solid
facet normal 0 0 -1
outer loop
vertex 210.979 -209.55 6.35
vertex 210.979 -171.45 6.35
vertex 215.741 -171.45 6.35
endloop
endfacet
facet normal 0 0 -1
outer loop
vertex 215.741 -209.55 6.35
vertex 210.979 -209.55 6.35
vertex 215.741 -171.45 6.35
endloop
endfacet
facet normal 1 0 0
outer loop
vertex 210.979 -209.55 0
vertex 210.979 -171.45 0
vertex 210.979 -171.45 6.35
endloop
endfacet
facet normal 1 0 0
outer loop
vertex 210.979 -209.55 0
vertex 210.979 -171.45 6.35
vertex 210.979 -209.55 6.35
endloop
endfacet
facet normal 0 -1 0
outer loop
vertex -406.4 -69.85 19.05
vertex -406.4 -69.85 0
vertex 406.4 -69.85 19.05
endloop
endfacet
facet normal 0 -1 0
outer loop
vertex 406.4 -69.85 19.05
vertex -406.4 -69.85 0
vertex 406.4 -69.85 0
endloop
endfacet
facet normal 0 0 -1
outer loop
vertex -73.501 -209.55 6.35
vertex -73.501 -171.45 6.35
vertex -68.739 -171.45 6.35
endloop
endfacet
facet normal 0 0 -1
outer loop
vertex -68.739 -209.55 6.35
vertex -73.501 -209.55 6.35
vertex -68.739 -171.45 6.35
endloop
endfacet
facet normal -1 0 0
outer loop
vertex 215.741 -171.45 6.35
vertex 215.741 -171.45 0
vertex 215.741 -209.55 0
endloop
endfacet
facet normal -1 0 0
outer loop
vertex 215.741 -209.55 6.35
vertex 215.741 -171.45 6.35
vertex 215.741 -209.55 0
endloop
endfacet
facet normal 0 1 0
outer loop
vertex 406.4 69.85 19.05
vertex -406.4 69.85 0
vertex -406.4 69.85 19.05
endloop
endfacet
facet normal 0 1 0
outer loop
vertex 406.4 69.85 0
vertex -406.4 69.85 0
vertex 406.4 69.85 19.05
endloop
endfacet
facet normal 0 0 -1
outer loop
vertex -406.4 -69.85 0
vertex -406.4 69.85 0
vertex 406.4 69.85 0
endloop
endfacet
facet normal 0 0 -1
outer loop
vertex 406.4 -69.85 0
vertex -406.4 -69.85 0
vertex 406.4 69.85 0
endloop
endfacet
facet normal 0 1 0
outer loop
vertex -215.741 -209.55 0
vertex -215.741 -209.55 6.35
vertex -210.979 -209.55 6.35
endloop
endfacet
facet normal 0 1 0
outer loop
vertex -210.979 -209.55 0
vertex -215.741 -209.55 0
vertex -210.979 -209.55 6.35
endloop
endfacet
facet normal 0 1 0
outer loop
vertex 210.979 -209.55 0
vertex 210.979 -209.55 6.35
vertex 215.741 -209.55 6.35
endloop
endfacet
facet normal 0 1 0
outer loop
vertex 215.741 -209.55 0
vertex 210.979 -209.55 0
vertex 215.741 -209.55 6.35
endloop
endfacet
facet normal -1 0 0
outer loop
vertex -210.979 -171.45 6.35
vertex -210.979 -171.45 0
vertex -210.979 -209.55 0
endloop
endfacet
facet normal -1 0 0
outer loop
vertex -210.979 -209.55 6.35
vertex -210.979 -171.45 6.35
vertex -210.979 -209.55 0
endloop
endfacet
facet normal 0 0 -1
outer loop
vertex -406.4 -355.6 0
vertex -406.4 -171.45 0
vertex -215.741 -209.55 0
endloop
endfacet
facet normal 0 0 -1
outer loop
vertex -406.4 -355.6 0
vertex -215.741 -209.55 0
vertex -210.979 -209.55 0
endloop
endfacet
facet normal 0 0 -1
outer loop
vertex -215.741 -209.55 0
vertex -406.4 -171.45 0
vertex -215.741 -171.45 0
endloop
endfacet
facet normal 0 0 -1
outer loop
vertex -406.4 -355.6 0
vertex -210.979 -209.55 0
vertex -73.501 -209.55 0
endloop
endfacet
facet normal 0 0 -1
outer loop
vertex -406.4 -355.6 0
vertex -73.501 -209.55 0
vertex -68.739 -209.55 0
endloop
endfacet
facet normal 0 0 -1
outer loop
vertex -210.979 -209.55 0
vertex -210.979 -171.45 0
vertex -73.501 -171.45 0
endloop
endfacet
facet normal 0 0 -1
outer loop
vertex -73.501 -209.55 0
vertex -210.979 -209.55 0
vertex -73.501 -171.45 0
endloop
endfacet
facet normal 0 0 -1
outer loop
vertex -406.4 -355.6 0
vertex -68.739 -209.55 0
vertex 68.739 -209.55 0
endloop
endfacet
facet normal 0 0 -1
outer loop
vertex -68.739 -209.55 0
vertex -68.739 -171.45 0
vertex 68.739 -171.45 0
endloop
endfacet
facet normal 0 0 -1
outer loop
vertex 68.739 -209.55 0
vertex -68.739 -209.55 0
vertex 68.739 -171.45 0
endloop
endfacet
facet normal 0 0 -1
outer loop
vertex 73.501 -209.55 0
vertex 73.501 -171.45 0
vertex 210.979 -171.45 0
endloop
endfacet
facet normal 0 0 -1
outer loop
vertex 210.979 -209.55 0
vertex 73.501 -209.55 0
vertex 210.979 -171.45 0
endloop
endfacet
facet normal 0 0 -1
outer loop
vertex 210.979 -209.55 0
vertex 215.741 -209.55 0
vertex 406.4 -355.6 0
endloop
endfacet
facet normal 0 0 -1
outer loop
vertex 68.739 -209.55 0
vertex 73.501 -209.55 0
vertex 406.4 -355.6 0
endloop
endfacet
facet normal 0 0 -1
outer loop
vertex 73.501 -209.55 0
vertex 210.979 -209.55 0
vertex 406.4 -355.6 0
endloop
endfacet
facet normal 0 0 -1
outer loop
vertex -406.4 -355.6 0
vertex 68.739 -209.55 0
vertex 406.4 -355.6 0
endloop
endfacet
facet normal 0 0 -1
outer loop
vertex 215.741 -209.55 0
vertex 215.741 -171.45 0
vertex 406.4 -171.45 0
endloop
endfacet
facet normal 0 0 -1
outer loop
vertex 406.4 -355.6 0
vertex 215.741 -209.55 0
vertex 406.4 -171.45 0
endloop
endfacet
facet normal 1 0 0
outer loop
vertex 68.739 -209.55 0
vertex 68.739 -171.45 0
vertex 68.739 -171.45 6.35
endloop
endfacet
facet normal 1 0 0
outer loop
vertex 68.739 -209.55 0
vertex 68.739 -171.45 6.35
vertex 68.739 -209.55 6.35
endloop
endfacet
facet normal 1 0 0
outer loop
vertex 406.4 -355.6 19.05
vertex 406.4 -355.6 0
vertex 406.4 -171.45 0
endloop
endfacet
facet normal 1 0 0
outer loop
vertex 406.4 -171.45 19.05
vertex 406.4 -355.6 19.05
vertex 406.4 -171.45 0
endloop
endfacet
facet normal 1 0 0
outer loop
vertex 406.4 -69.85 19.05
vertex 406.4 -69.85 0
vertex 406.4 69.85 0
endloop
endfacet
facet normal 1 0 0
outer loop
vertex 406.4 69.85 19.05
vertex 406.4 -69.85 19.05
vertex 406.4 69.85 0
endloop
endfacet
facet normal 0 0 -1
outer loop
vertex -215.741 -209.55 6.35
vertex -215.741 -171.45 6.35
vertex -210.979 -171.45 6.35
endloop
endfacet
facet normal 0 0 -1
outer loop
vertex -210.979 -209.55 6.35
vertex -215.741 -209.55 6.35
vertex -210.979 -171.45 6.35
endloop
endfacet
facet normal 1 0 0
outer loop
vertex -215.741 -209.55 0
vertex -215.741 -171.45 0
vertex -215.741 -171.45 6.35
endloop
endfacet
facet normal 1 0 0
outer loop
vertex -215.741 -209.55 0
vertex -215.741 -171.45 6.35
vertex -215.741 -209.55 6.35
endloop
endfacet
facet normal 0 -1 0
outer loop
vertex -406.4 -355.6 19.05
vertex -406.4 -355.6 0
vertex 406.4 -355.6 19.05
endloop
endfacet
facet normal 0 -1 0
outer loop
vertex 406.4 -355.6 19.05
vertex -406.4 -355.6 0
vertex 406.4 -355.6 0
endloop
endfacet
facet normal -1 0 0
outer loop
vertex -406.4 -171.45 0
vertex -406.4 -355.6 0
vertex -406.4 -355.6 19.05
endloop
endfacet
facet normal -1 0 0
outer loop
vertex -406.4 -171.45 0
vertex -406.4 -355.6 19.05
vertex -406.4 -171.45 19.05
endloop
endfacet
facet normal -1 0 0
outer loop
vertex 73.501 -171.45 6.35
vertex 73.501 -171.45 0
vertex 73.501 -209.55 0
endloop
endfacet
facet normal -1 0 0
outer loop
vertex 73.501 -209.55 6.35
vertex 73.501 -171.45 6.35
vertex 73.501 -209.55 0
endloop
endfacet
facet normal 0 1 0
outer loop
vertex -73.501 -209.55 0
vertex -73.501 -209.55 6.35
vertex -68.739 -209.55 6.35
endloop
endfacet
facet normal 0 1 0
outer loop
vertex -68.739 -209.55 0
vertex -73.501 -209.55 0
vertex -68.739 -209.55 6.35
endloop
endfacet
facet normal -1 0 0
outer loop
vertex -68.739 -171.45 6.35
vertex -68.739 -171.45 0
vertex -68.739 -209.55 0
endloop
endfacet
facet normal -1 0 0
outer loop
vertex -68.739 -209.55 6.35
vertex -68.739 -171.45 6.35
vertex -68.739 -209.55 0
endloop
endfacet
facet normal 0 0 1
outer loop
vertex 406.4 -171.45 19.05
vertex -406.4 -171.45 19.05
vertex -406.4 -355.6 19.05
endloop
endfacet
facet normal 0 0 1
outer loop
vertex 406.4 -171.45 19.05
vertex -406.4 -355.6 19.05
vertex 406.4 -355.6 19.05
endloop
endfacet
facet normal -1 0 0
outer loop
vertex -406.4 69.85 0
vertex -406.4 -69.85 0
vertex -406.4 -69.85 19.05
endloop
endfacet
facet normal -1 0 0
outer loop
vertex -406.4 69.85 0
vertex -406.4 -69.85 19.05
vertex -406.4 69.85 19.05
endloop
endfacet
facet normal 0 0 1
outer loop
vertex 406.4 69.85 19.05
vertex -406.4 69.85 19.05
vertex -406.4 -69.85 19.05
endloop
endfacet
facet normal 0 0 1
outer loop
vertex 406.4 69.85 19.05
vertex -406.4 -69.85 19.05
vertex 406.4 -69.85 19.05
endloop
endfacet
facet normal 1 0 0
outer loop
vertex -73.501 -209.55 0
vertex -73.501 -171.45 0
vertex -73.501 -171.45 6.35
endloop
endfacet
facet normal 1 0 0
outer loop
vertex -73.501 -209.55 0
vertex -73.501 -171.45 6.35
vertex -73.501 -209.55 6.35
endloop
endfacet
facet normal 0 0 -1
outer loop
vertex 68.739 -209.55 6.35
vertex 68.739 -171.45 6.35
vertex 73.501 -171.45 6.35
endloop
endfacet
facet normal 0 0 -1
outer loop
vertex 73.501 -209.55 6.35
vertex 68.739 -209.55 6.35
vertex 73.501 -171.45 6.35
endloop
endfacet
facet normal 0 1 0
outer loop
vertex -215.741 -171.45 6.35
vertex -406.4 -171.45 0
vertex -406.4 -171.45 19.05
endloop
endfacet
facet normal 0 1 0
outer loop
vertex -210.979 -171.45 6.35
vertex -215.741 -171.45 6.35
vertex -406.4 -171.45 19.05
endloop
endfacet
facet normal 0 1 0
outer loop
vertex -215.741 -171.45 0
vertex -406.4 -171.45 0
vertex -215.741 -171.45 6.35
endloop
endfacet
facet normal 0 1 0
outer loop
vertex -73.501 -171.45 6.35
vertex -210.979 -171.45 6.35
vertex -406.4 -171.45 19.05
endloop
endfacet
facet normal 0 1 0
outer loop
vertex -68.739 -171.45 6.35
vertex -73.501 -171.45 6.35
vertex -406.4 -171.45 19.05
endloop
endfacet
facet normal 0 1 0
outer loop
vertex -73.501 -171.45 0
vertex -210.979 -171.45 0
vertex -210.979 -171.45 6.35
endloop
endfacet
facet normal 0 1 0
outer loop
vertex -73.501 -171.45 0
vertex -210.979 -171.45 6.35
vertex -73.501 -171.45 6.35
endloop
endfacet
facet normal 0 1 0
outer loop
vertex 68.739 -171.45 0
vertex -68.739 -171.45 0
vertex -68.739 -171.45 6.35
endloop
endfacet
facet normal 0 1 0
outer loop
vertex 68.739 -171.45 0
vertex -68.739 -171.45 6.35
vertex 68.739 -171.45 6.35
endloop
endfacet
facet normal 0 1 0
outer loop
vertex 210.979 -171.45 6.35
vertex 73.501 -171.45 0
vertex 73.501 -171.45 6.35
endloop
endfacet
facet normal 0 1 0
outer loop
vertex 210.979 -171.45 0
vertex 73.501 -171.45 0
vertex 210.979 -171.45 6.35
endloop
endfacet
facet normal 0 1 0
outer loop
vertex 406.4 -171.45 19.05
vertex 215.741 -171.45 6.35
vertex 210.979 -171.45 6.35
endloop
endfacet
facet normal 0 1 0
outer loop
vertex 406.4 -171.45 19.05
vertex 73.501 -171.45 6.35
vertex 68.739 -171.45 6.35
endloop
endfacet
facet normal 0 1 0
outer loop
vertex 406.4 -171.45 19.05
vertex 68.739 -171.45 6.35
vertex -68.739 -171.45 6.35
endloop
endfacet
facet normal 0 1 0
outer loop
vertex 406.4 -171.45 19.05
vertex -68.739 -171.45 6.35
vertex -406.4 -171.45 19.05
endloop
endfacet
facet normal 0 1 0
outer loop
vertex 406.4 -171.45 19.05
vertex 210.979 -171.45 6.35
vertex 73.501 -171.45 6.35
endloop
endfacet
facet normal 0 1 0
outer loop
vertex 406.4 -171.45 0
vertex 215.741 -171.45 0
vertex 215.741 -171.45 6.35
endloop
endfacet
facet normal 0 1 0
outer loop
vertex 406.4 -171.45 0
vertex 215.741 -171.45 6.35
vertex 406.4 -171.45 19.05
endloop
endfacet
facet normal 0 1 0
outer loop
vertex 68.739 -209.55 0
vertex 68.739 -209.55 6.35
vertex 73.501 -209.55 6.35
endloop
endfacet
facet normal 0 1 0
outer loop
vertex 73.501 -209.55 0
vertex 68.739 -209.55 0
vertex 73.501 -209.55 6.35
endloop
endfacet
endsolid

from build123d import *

# Parameters (mm, degrees)
F0_W     = 812.8
F0_H     = 139.7
F1_DEPTH = 19.05
F2_W     = 812.8
F2_H     = 184.15
F3_DEPTH = 19.05
F4_W     = 4.7625
F4_H     = 38.1
F5_DEPTH = 6.35


with BuildPart() as f1:
    # F0 (on Top) → F1 (new body)
    with BuildSketch(Plane.XY):
        Rectangle(F0_W, F0_H)
    extrude(amount=F1_DEPTH)


with BuildPart() as f3:
    # F2 (on Top) → F3 (new body)
    with BuildSketch(Plane.XY):
        with Locations((0, -263.525)):
            Rectangle(F2_W, F2_H)
    extrude(amount=F3_DEPTH)

    # F4 (on face) → F5 (cut)
    with BuildSketch(Plane(origin=(0, 0, 0), x_dir=(1, 0, 0), z_dir=(0, 0, -1))):
        with Locations((71.12, 190.5)):
            Rectangle(F4_W, F4_H)
        with Locations((213.36, 190.5)):
            Rectangle(F4_W, F4_H)
        with Locations((-213.36, 190.5)):
            Rectangle(F4_W, F4_H)
        with Locations((-71.12, 190.5)):
            Rectangle(F4_W, F4_H)
    extrude(amount=-F5_DEPTH, mode=Mode.SUBTRACT)


solid = Compound([f1.part, f3.part])
